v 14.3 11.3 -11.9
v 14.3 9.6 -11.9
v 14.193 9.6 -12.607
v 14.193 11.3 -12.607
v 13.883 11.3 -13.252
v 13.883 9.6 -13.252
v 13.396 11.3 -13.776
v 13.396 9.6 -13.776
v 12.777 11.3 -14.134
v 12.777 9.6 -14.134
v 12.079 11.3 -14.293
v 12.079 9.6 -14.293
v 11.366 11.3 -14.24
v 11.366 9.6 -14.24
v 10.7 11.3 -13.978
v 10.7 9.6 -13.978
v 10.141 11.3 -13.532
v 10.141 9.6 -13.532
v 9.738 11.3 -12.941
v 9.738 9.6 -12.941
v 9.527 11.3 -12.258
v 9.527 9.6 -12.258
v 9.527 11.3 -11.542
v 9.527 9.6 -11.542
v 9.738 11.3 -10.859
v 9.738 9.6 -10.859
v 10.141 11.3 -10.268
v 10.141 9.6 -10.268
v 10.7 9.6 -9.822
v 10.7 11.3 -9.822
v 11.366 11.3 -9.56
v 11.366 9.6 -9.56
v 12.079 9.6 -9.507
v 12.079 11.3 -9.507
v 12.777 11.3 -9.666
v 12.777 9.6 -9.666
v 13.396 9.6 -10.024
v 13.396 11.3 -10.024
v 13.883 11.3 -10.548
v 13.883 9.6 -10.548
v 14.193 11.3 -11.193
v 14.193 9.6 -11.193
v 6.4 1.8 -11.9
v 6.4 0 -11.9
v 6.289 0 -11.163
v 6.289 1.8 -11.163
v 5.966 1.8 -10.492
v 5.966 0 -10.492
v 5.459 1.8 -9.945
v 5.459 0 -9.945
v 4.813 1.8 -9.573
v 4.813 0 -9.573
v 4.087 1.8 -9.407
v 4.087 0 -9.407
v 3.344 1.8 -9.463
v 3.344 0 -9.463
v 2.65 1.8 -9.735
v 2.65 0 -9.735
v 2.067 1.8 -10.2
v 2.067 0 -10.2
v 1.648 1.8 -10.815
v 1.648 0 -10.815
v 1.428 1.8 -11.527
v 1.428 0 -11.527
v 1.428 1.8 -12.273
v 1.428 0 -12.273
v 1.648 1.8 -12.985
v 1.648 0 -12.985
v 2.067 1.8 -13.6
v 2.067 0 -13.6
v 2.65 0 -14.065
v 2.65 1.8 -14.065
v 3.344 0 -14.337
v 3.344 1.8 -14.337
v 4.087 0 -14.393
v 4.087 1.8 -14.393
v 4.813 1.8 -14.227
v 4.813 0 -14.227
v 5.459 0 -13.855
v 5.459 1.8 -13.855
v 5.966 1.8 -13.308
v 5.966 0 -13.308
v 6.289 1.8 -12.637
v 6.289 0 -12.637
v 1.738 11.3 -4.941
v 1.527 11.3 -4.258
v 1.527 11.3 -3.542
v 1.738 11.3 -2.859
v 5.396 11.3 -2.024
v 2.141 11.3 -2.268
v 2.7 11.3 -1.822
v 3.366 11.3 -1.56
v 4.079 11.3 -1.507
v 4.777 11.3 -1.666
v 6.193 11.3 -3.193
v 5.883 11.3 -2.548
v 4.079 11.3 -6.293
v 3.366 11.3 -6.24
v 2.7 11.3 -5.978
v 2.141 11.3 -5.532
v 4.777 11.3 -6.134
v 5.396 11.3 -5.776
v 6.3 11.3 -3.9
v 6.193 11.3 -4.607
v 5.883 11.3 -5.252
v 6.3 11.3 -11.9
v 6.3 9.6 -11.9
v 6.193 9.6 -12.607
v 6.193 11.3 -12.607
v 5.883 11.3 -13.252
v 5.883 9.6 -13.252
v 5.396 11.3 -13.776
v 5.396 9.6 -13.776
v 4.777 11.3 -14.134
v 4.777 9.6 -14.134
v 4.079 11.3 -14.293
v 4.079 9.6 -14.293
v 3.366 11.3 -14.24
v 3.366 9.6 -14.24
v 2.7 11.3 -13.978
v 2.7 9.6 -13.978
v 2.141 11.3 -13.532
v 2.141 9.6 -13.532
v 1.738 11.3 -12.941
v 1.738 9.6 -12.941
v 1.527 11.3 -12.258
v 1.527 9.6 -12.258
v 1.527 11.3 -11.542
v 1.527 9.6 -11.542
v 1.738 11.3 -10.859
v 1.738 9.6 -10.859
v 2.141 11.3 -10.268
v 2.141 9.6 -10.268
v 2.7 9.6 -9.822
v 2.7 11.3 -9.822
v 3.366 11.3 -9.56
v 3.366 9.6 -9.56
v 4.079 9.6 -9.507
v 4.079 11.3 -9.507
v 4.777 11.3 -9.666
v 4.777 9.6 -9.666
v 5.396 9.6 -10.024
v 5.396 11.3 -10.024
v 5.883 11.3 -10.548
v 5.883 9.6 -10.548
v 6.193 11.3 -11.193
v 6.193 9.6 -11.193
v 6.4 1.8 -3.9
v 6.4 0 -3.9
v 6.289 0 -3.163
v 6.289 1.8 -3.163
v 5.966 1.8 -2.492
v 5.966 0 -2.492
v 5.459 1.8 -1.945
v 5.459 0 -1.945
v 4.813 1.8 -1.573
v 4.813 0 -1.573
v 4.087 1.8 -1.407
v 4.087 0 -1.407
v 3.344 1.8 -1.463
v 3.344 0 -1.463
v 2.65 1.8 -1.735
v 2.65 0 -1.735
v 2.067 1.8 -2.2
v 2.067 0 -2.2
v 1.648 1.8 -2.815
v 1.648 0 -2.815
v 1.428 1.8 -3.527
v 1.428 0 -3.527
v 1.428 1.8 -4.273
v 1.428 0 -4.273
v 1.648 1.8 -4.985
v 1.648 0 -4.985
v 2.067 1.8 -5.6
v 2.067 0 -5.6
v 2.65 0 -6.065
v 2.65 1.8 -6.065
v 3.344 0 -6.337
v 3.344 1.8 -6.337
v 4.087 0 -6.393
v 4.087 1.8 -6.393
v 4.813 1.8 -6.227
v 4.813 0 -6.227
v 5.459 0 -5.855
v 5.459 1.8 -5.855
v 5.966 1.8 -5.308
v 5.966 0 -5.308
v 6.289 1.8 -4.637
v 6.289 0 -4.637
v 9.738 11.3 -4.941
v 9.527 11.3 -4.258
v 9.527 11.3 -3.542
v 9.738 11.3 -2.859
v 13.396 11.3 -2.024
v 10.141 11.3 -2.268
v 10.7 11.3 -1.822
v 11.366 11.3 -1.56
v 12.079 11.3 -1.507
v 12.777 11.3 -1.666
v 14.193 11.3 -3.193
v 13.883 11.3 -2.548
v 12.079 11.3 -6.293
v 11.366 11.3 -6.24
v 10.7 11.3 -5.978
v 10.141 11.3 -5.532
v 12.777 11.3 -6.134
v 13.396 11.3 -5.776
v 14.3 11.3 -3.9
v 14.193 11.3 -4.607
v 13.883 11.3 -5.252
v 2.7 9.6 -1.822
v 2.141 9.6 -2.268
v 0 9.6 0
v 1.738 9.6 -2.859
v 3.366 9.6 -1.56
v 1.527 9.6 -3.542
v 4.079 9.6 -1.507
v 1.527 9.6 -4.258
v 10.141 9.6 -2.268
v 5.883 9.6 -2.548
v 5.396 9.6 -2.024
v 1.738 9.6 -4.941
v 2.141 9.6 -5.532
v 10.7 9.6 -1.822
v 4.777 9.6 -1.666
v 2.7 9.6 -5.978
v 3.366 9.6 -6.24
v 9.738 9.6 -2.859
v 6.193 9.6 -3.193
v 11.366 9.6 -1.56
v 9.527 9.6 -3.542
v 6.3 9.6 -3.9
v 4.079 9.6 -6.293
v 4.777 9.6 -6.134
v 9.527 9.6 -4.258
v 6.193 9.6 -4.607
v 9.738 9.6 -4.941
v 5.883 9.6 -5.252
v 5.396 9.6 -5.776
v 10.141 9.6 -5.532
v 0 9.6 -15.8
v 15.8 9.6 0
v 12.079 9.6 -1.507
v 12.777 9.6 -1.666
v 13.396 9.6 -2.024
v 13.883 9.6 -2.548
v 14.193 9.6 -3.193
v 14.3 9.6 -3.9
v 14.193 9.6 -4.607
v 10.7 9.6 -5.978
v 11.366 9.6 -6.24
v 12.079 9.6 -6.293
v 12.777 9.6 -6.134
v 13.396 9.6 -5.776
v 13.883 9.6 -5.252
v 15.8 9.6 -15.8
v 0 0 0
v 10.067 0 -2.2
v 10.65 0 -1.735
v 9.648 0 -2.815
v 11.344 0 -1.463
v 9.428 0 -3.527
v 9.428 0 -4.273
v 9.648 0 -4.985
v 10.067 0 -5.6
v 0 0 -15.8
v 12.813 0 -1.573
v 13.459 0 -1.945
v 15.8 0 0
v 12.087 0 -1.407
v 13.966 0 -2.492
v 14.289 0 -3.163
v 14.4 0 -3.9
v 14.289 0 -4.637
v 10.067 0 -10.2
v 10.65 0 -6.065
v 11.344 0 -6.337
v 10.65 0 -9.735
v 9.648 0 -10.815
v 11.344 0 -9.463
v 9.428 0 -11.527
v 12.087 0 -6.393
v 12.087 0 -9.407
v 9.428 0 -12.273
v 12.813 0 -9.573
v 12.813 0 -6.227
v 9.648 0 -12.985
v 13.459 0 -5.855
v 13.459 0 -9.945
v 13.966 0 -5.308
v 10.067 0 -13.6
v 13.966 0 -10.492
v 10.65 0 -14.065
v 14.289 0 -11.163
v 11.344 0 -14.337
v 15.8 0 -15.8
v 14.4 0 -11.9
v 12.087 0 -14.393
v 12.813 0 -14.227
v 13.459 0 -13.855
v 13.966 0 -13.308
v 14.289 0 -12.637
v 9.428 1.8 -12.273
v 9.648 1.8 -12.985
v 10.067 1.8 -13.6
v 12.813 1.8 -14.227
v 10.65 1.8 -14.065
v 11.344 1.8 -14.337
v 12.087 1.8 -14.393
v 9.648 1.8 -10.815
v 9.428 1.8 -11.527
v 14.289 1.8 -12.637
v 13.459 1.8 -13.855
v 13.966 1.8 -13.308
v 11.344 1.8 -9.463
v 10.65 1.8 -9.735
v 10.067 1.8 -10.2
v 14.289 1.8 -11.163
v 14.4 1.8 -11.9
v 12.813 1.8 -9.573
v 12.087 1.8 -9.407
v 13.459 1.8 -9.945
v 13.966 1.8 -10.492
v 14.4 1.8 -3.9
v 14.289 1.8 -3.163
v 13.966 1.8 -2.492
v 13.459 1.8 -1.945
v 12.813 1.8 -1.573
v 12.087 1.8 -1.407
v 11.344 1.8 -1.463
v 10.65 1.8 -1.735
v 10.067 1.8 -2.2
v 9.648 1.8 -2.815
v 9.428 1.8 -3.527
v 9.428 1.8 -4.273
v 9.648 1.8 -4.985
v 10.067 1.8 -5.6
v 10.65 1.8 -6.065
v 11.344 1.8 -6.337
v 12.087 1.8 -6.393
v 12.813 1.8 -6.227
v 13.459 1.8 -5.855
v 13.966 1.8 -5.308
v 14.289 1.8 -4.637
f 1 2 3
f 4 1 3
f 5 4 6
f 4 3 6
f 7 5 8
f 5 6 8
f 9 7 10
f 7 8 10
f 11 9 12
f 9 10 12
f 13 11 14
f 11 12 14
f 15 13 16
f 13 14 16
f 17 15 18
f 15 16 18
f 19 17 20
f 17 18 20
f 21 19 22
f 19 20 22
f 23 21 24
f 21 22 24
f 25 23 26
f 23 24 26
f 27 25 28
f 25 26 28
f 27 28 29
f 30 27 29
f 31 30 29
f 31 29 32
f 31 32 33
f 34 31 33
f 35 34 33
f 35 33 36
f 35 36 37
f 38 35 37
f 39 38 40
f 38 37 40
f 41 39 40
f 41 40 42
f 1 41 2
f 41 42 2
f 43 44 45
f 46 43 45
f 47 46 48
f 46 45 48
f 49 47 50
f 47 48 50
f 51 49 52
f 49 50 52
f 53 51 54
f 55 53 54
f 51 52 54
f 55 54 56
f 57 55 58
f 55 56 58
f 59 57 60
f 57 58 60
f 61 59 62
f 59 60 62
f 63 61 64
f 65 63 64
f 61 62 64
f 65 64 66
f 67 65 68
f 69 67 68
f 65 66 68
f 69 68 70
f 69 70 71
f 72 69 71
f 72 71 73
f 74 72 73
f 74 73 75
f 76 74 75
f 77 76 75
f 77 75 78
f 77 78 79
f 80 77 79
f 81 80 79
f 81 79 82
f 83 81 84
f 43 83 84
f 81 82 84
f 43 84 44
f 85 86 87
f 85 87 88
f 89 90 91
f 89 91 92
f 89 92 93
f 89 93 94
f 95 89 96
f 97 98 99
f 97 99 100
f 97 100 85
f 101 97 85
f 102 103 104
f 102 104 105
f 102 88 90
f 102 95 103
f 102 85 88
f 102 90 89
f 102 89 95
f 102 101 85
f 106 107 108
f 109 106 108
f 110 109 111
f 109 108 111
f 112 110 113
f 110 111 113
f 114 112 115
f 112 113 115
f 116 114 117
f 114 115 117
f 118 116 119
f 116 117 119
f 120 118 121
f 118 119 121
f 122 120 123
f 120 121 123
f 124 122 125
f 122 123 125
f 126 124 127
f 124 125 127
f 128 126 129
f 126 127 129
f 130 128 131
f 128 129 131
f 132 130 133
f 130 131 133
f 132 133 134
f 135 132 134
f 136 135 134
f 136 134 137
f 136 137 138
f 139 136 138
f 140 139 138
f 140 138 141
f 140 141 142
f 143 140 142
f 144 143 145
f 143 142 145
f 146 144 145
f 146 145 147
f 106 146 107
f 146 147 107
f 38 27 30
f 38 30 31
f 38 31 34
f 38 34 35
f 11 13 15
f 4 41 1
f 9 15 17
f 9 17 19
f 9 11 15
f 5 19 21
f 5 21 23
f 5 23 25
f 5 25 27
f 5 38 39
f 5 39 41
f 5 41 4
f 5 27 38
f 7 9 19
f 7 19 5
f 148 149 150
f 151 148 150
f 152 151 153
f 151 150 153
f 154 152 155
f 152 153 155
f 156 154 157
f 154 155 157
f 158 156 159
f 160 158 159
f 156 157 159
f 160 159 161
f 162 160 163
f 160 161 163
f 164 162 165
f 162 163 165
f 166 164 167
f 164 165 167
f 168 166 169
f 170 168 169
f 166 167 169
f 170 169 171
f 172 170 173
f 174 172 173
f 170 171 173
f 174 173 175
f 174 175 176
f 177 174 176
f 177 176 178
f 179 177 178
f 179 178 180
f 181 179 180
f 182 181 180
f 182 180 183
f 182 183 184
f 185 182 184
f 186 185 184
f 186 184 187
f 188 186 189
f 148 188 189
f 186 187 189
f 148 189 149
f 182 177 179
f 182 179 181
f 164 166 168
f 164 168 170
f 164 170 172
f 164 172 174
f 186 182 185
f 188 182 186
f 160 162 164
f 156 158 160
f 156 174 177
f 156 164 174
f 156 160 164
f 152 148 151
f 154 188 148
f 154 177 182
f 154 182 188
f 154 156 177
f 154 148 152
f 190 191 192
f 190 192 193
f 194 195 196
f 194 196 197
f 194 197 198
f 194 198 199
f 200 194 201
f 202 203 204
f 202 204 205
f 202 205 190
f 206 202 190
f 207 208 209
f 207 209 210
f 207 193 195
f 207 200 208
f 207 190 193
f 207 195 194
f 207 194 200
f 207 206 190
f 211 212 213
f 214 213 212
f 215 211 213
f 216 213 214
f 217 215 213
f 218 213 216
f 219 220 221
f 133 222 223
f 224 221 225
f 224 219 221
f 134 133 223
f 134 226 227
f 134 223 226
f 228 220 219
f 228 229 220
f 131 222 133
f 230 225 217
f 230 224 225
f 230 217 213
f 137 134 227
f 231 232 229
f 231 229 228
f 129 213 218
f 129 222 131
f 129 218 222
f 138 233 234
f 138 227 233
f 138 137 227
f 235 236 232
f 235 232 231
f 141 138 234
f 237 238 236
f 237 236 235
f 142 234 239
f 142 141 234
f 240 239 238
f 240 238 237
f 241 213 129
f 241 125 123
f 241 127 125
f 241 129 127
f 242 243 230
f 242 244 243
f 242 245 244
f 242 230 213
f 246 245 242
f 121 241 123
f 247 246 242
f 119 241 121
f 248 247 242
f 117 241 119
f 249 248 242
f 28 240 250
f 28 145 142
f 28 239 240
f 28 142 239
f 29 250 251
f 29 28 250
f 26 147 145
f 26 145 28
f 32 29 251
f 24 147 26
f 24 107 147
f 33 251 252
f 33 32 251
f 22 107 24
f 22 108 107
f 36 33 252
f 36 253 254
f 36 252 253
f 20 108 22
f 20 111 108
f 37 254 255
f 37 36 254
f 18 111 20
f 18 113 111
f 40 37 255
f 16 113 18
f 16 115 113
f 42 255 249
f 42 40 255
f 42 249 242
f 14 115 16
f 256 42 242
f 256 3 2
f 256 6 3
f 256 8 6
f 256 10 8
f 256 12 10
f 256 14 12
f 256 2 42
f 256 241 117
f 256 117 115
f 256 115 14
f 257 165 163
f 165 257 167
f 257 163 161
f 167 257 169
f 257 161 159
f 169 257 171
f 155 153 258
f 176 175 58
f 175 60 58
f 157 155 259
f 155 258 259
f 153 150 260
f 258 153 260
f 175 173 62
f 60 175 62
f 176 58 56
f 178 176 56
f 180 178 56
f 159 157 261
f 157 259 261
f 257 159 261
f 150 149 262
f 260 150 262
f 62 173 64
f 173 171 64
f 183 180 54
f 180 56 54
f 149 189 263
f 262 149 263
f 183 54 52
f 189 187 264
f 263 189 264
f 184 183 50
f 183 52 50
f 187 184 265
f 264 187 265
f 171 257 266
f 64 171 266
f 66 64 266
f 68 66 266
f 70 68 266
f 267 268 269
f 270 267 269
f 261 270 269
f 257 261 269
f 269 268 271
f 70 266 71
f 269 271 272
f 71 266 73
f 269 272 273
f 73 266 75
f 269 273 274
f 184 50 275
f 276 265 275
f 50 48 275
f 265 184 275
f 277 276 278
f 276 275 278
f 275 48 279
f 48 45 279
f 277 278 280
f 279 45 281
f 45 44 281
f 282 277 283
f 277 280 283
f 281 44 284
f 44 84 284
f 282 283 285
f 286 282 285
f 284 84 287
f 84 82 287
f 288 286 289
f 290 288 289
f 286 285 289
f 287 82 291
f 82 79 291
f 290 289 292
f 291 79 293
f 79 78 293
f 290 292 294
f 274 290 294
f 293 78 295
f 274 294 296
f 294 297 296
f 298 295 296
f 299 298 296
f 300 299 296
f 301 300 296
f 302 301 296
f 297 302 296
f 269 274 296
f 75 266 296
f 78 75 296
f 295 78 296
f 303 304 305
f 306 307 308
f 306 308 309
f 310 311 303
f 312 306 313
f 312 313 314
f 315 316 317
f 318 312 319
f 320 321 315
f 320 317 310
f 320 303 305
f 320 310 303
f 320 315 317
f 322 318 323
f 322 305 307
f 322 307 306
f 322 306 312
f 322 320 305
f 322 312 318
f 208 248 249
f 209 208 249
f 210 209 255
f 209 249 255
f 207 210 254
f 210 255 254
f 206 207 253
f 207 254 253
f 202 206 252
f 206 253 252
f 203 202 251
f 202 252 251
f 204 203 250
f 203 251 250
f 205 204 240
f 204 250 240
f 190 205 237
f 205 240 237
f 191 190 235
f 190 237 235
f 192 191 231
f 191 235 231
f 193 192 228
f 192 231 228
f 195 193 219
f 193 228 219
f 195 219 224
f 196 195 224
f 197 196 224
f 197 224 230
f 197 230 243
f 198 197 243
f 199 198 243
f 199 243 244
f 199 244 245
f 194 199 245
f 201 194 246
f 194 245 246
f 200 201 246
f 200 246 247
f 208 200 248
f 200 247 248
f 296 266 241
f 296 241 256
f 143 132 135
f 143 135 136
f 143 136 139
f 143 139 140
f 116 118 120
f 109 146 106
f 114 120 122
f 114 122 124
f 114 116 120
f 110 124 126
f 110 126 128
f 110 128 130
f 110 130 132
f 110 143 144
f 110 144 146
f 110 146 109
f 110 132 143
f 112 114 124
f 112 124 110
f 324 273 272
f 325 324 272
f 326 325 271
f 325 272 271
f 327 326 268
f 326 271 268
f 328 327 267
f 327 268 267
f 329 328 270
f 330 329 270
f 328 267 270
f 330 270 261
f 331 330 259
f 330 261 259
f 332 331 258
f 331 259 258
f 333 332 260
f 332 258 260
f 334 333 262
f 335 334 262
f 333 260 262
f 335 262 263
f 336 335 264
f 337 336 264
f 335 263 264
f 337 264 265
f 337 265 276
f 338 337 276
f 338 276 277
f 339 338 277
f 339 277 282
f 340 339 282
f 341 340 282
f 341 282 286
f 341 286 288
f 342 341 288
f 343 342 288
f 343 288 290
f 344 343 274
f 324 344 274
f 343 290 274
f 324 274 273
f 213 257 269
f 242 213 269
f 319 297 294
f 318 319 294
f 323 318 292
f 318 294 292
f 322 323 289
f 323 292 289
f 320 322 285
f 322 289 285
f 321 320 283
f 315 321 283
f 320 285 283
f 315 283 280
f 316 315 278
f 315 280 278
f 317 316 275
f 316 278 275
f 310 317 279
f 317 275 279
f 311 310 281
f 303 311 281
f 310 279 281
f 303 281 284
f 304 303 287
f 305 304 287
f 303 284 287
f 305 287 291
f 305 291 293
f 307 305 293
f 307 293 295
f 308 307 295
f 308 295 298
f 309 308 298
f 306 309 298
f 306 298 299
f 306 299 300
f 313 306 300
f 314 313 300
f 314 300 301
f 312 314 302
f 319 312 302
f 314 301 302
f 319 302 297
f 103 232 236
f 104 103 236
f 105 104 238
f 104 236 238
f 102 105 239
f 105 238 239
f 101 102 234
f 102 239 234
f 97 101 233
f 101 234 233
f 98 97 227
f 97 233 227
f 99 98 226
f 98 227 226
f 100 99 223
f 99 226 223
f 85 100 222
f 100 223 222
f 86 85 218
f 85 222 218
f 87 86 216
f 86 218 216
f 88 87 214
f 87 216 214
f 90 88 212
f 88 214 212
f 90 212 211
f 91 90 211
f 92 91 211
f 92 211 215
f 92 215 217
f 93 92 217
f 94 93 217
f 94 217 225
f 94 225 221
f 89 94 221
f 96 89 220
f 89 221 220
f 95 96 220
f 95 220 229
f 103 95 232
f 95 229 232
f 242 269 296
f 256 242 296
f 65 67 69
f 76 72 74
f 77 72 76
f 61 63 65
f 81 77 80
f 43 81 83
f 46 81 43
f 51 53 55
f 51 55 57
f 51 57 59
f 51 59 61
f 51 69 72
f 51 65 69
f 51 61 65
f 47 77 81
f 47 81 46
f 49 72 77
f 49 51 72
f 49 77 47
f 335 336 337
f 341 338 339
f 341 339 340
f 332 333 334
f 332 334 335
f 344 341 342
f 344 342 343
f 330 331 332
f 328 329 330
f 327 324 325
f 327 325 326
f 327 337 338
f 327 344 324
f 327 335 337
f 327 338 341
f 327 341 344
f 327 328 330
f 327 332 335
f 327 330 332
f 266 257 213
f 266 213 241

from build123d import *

# Parameters (mm, degrees)
SKETCH_1_W          = 15.8
SKETCH_1_H          = 15.8
EXTRUDE_1_DEPTH     = 9.6
SKETCH_2_R          = 2.4
EXTRUDE_2_DEPTH     = 1.7
SKETCH_3_R          = 2.5
CUT_EXTRUDE_2_DEPTH = 1.8


with BuildPart() as part:
    # Эскиз1 → Бобышка-Вытянуть1 (new body)
    with BuildSketch(Plane(origin=(0, 0, 0), x_dir=(1, 0, 0), z_dir=(0, 1, 0))):
        with Locations((7.9, 7.9)):
            Rectangle(SKETCH_1_W, SKETCH_1_H)
    extrude(amount=EXTRUDE_1_DEPTH)

    # Эскиз2 → Бобышка-Вытянуть2 (add)
    with BuildSketch(Plane(origin=(0, 9.6, 0), x_dir=(1, 0, 0), z_dir=(0, 1, 0))):
        with Locations((3.9, 11.9)):
            Circle(SKETCH_2_R)
        with Locations((11.9, 11.9)):
            Circle(SKETCH_2_R)
        with Locations((11.9, 3.9)):
            Circle(SKETCH_2_R)
        with Locations((3.9, 3.9)):
            Circle(SKETCH_2_R)
    extrude(amount=EXTRUDE_2_DEPTH)

    # Эскиз3 → Вырез-Вытянуть2 (cut)
    with BuildSketch(Plane.XZ):
        with Locations((11.9, -3.9)):
            Circle(SKETCH_3_R)
        with Locations((3.9, -3.9)):
            Circle(SKETCH_3_R)
        with Locations((3.9, -11.9)):
            Circle(SKETCH_3_R)
        with Locations((11.9, -11.9)):
            Circle(SKETCH_3_R)
    extrude(amount=-CUT_EXTRUDE_2_DEPTH, mode=Mode.SUBTRACT)


solid = part.part
